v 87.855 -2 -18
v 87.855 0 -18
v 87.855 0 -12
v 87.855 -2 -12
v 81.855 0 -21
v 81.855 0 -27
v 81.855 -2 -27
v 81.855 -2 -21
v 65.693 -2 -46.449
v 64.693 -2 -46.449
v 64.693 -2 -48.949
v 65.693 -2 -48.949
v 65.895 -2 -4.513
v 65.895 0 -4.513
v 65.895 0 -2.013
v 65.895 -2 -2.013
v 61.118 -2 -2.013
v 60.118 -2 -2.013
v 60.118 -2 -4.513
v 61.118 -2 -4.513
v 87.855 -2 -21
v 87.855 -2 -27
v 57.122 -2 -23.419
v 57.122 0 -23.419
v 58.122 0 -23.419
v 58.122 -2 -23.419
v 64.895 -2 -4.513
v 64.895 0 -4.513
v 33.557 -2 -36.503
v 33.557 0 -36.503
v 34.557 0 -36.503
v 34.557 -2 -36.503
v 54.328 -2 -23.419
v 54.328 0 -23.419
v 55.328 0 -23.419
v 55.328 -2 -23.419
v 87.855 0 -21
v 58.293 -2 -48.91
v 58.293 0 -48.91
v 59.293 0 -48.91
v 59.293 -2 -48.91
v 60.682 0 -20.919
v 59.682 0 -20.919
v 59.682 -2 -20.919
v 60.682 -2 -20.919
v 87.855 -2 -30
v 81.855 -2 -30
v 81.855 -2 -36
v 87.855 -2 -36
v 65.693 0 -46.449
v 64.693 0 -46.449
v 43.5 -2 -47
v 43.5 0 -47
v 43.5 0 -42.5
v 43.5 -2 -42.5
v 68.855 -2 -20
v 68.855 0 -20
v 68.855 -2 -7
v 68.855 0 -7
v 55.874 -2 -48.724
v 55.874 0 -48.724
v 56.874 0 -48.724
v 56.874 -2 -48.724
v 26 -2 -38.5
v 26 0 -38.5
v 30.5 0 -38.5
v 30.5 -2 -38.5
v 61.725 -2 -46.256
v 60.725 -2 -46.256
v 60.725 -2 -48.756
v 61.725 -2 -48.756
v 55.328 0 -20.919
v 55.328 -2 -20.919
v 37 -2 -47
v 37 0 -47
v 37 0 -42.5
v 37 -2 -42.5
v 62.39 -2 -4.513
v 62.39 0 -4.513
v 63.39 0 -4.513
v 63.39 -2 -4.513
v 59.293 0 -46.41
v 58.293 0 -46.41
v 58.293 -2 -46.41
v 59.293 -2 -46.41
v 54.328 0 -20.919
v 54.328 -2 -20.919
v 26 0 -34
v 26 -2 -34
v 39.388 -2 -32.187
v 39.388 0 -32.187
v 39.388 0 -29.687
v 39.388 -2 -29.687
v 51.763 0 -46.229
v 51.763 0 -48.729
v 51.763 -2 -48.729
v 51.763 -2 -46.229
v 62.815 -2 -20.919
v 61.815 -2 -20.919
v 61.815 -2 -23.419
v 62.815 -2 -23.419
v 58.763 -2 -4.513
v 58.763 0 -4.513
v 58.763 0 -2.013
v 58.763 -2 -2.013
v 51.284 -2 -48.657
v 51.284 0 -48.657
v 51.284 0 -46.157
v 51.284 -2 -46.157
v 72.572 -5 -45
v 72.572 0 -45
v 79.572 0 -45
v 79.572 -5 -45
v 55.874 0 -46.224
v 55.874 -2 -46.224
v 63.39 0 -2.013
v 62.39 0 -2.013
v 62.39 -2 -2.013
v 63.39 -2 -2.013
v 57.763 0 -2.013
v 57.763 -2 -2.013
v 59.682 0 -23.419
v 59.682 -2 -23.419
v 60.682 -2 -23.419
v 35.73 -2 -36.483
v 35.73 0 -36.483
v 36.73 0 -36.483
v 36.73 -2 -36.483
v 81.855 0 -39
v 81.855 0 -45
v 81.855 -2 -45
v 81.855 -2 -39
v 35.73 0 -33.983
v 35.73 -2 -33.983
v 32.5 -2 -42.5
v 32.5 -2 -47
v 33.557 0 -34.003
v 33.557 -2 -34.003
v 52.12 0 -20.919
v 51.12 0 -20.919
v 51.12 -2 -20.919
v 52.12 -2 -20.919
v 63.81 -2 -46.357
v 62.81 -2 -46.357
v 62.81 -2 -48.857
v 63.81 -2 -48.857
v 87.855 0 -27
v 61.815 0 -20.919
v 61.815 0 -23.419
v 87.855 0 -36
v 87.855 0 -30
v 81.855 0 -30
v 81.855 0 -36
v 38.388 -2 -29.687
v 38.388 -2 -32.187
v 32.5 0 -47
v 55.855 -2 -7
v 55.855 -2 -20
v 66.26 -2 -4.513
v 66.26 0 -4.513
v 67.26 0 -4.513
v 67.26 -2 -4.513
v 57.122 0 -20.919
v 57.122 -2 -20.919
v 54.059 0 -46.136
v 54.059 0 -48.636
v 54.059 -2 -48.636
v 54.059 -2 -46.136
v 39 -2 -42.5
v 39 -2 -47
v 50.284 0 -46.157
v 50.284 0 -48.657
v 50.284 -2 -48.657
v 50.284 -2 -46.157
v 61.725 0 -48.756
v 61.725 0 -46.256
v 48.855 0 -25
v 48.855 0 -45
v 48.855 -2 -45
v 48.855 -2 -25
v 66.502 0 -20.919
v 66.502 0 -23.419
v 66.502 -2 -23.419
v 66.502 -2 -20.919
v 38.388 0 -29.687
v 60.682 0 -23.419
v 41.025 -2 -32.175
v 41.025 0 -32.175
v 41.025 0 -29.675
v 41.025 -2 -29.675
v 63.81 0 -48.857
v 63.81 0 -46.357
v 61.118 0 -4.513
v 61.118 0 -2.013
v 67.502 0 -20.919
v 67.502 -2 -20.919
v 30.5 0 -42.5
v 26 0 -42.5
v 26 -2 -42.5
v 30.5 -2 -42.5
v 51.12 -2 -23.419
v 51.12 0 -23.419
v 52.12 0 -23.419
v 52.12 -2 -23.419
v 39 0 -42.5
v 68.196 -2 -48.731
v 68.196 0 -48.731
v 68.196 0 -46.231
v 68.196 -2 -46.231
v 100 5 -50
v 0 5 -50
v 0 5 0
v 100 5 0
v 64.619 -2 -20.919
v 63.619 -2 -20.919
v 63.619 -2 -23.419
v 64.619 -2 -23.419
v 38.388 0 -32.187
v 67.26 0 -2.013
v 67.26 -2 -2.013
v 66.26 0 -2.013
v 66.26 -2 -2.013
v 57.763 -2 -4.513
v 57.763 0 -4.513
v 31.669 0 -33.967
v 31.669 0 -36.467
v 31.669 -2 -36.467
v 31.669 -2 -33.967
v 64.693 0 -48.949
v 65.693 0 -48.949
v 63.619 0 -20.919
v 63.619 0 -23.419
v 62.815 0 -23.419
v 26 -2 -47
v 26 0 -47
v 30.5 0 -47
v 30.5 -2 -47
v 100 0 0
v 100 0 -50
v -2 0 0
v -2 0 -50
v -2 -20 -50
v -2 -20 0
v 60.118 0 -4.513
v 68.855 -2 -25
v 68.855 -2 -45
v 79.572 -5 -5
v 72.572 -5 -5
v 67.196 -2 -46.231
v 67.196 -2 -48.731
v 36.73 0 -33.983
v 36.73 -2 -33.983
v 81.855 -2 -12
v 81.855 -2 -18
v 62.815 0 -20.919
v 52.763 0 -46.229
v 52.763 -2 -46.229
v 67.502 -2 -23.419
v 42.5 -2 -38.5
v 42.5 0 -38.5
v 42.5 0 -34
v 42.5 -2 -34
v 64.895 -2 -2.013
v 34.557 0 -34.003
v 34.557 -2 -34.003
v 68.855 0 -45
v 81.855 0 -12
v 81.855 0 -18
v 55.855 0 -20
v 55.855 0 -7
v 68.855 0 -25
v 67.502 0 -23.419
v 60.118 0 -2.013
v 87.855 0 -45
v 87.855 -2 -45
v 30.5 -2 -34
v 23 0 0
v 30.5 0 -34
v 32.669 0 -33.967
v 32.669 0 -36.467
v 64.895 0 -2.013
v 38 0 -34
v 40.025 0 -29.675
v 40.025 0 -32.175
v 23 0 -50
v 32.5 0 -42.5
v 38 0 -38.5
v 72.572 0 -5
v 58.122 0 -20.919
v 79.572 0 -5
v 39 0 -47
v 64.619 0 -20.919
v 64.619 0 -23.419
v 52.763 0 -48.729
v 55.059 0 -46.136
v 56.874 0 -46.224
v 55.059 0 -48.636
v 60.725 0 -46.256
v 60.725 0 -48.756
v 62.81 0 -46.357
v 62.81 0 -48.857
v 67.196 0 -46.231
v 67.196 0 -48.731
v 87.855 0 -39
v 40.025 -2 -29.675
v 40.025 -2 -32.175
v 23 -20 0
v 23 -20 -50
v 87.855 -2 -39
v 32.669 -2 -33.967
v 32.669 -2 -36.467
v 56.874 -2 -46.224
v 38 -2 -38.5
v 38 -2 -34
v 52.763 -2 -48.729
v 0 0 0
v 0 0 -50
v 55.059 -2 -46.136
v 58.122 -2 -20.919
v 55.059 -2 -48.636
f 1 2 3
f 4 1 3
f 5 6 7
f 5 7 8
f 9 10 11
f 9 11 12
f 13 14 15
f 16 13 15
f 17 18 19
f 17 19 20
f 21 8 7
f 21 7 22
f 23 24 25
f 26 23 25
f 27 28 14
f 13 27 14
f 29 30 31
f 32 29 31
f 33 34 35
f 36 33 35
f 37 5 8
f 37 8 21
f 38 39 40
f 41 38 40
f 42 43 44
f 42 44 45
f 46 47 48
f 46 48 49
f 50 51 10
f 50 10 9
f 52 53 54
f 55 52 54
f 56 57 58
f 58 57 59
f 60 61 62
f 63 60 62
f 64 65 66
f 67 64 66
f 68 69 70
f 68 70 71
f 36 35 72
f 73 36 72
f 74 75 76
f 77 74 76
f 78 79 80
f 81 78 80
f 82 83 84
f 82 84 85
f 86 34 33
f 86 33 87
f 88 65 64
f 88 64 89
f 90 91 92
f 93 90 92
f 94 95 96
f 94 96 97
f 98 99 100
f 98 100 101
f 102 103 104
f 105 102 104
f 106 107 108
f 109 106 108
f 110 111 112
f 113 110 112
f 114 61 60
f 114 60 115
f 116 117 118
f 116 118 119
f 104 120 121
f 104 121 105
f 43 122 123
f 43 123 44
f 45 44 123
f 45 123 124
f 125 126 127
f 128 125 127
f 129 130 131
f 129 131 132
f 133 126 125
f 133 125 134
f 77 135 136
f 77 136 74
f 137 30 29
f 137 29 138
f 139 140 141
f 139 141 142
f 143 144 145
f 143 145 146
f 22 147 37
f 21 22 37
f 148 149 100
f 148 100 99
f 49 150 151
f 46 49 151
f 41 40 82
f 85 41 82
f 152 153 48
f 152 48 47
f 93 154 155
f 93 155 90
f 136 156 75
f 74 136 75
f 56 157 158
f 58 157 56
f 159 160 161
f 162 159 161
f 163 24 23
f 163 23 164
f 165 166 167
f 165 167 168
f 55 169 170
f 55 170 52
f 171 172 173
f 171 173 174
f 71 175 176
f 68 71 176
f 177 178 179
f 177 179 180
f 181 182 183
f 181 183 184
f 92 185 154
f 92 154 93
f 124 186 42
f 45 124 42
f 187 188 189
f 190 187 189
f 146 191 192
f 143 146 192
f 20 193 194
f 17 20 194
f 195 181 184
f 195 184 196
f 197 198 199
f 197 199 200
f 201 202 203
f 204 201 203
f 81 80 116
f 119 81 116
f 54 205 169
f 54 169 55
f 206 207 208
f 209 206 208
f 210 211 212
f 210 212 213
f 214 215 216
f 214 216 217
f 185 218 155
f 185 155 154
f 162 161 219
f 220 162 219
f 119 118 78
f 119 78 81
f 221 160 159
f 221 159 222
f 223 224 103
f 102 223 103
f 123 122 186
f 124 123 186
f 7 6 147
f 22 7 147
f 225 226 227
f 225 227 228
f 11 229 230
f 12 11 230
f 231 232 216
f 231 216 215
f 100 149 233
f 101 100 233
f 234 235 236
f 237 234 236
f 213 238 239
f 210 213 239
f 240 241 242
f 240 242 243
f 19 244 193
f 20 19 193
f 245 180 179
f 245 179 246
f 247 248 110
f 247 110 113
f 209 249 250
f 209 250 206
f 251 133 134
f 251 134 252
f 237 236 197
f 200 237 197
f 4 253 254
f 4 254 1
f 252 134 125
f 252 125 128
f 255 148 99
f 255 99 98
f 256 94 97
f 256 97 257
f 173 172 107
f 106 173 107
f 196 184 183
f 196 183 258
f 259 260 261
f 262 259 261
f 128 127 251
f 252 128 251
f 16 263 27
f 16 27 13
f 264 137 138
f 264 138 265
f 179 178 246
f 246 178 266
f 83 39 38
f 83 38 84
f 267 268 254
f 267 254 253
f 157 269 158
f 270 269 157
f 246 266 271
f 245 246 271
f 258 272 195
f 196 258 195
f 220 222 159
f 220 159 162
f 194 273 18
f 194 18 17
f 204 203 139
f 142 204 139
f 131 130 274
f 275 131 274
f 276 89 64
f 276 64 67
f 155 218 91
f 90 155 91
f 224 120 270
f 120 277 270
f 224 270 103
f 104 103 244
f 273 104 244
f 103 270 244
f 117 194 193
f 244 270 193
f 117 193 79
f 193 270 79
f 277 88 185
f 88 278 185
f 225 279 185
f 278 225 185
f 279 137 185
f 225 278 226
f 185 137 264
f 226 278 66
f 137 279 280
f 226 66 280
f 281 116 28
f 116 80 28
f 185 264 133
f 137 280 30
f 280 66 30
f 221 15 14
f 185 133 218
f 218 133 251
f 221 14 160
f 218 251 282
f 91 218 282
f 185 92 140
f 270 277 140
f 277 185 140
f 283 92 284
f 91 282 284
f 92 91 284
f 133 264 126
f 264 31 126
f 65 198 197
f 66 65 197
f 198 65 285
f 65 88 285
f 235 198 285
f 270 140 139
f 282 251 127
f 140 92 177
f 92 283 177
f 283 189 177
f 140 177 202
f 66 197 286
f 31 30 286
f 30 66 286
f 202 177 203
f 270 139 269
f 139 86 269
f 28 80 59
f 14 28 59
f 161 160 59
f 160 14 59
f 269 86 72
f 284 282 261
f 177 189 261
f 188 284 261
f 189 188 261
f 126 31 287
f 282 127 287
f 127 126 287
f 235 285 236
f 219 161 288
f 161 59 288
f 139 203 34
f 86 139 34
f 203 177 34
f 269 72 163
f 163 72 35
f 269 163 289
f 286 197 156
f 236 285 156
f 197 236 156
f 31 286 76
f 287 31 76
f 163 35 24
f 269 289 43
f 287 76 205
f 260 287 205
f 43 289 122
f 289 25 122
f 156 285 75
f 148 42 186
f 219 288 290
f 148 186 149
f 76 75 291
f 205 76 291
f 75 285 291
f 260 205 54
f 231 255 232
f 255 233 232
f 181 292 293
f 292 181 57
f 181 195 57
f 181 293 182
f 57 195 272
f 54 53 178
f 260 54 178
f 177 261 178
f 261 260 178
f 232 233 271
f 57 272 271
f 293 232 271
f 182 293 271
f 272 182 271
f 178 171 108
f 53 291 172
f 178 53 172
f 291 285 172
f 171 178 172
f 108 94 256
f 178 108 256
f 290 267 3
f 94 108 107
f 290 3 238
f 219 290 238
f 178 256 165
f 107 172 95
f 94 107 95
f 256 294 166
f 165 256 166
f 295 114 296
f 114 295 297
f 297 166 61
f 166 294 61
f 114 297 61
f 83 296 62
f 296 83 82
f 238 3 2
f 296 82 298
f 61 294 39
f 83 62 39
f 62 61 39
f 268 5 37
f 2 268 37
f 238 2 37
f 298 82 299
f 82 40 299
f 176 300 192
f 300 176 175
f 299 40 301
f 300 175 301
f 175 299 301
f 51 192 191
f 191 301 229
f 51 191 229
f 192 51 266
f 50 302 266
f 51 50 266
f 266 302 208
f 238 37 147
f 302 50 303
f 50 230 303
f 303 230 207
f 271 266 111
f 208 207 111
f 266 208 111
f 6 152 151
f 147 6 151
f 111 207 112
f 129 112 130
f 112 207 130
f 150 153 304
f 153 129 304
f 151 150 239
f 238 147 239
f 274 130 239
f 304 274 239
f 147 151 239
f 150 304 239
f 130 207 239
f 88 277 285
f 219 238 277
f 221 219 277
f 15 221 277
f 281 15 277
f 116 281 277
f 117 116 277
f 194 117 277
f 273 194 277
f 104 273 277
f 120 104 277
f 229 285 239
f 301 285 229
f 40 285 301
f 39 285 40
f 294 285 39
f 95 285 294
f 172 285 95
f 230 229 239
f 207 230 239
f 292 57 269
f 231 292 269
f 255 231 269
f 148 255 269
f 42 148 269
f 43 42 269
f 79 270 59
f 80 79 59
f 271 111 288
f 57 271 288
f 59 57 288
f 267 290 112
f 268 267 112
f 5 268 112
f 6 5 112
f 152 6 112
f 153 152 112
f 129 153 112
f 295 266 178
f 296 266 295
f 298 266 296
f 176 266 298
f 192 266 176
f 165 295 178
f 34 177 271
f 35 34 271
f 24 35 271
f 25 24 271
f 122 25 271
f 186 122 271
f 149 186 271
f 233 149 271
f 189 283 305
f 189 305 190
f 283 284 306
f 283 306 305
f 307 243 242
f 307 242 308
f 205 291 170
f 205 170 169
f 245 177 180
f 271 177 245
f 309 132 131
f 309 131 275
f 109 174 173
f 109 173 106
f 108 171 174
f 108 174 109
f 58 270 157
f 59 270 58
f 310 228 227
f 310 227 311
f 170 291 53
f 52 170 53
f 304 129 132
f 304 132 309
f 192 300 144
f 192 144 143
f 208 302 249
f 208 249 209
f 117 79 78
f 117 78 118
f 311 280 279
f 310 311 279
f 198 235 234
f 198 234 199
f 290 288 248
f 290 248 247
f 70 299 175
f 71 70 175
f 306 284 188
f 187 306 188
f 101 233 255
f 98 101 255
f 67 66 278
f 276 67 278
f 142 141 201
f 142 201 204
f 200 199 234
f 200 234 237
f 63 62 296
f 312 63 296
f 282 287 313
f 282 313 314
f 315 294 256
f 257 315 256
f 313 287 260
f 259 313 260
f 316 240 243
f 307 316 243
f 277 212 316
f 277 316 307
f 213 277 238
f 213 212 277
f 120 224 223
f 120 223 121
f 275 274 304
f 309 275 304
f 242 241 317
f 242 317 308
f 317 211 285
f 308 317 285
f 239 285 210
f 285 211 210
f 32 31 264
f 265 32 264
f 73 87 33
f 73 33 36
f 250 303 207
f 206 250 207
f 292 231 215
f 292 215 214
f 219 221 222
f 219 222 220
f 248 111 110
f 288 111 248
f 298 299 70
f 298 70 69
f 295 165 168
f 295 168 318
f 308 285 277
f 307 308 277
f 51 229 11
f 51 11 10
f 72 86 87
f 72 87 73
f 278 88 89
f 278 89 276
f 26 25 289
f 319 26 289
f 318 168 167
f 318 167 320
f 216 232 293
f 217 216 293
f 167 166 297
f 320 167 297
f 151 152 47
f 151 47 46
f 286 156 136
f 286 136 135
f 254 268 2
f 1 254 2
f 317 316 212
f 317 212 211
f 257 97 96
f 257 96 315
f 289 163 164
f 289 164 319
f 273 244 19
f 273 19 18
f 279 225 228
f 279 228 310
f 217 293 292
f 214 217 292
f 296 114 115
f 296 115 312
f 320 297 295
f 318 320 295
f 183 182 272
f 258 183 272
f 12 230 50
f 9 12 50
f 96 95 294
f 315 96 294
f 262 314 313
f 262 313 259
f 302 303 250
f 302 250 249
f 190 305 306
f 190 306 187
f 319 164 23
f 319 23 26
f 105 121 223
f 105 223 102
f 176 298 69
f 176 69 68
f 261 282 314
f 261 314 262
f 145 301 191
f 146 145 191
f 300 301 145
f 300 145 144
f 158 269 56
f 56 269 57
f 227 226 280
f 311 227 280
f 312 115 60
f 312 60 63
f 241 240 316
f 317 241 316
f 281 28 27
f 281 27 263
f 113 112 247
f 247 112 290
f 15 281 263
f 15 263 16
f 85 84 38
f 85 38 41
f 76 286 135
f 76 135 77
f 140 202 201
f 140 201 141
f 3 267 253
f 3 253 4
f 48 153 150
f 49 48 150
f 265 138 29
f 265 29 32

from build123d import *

# Parameters (mm, degrees)
SKETCH1_W           = 100
SKETCH1_H           = 50
BOSS_EXTRUDE1_DEPTH = 5
SKETCH2_W           = 25
SKETCH2_H           = 50
BOSS_EXTRUDE2_DEPTH = 20
SKETCH3_W           = 13
SKETCH3_H           = 13
SKETCH3_W_2         = 20
SKETCH3_H_2         = 20
SKETCH3_W_3         = 4.5
SKETCH3_H_3         = 4.5
SKETCH3_W_4         = 1
SKETCH3_H_4         = 2.5
SKETCH3_W_5         = 6
SKETCH3_H_5         = 6
BOSS_EXTRUDE3_DEPTH = 2
SKETCH4_W           = 7
SKETCH4_H           = 40
BOSS_EXTRUDE4_DEPTH = 5


with BuildPart() as part:
    # Sketch1 → Boss-Extrude1 (new body)
    with BuildSketch(Plane(origin=(0, 0, 0), x_dir=(1, 0, 0), z_dir=(0, 1, 0))):
        with Locations((50, 25)):
            Rectangle(SKETCH1_W, SKETCH1_H)
    extrude(amount=BOSS_EXTRUDE1_DEPTH)

    # Sketch2 → Boss-Extrude2 (add)
    with BuildSketch(Plane.XZ):
        with Locations((10.5, -25)):
            Rectangle(SKETCH2_W, SKETCH2_H)
    extrude(amount=BOSS_EXTRUDE2_DEPTH)

    # Sketch3 → Boss-Extrude3 (add)
    with BuildSketch(Plane.XZ):
        with Locations((62.354538524, -13.5)):
            Rectangle(SKETCH3_W, SKETCH3_H)
        with Locations((58.854538524, -35)):
            Rectangle(SKETCH3_W_2, SKETCH3_H_2)
        with Locations((41.25, -44.75)):
            Rectangle(SKETCH3_W_3, SKETCH3_H_3)
        with Locations((36.230283198, -35.23329394)):
            Rectangle(SKETCH3_W_4, SKETCH3_H_4)
        with Locations((84.854538524, -15)):
            Rectangle(SKETCH3_W_5, SKETCH3_H_5)
        with Locations((84.854538524, -24)):
            Rectangle(SKETCH3_W_5, SKETCH3_H_5)
        with Locations((84.854538524, -33)):
            Rectangle(SKETCH3_W_5, SKETCH3_H_5)
        with Locations((84.854538524, -42)):
            Rectangle(SKETCH3_W_5, SKETCH3_H_5)
        with Locations((34.75, -44.75)):
            Rectangle(SKETCH3_W_3, SKETCH3_H_3)
        with Locations((28.25, -44.75)):
            Rectangle(SKETCH3_W_3, SKETCH3_H_3)
        with Locations((40.25, -36.25)):
            Rectangle(SKETCH3_W_3, SKETCH3_H_3)
        with Locations((28.25, -36.25)):
            Rectangle(SKETCH3_W_3, SKETCH3_H_3)
        with Locations((34.056841582, -35.253056661)):
            Rectangle(SKETCH3_W_4, SKETCH3_H_4)
        with Locations((32.169211896, -35.217412145)):
            Rectangle(SKETCH3_W_4, SKETCH3_H_4)
        with Locations((38.888023686, -30.936743788)):
            Rectangle(SKETCH3_W_4, SKETCH3_H_4)
        with Locations((40.525487338, -30.924614304)):
            Rectangle(SKETCH3_W_4, SKETCH3_H_4)
        with Locations((50.783834941, -47.406763186)):
            Rectangle(SKETCH3_W_4, SKETCH3_H_4)
        with Locations((52.26338259, -47.478555209)):
            Rectangle(SKETCH3_W_4, SKETCH3_H_4)
        with Locations((54.55859758, -47.386324582)):
            Rectangle(SKETCH3_W_4, SKETCH3_H_4)
        with Locations((56.374406059, -47.474432974)):
            Rectangle(SKETCH3_W_4, SKETCH3_H_4)
        with Locations((58.792603581, -47.659638141)):
            Rectangle(SKETCH3_W_4, SKETCH3_H_4)
        with Locations((61.225203353, -47.50620675)):
            Rectangle(SKETCH3_W_4, SKETCH3_H_4)
        with Locations((63.310020495, -47.607368237)):
            Rectangle(SKETCH3_W_4, SKETCH3_H_4)
        with Locations((65.19308114, -47.698739903)):
            Rectangle(SKETCH3_W_4, SKETCH3_H_4)
        with Locations((67.695813528, -47.480844473)):
            Rectangle(SKETCH3_W_4, SKETCH3_H_4)
        with Locations((51.620089841, -22.168837292)):
            Rectangle(SKETCH3_W_4, SKETCH3_H_4)
        with Locations((54.828135526, -22.168837292)):
            Rectangle(SKETCH3_W_4, SKETCH3_H_4)
        with Locations((57.621886299, -22.168837292)):
            Rectangle(SKETCH3_W_4, SKETCH3_H_4)
        with Locations((60.182498208, -22.168837292)):
            Rectangle(SKETCH3_W_4, SKETCH3_H_4)
        with Locations((64.118696459, -22.168837292)):
            Rectangle(SKETCH3_W_4, SKETCH3_H_4)
        with Locations((62.314527943, -22.168837292)):
            Rectangle(SKETCH3_W_4, SKETCH3_H_4)
        with Locations((67.001738379, -22.168837292)):
            Rectangle(SKETCH3_W_4, SKETCH3_H_4)
        with Locations((58.263095719, -3.26300702)):
            Rectangle(SKETCH3_W_4, SKETCH3_H_4)
        with Locations((60.618093401, -3.26300702)):
            Rectangle(SKETCH3_W_4, SKETCH3_H_4)
        with Locations((62.890151559, -3.26300702)):
            Rectangle(SKETCH3_W_4, SKETCH3_H_4)
        with Locations((65.395210185, -3.26300702)):
            Rectangle(SKETCH3_W_4, SKETCH3_H_4)
        with Locations((66.760195848, -3.26300702)):
            Rectangle(SKETCH3_W_4, SKETCH3_H_4)
    extrude(amount=BOSS_EXTRUDE3_DEPTH)

    # Sketch4 → Boss-Extrude4 (add)
    with BuildSketch(Plane.XZ):
        with Locations((76.072105727, -25)):
            Rectangle(SKETCH4_W, SKETCH4_H)
    extrude(amount=BOSS_EXTRUDE4_DEPTH)


solid = part.part
